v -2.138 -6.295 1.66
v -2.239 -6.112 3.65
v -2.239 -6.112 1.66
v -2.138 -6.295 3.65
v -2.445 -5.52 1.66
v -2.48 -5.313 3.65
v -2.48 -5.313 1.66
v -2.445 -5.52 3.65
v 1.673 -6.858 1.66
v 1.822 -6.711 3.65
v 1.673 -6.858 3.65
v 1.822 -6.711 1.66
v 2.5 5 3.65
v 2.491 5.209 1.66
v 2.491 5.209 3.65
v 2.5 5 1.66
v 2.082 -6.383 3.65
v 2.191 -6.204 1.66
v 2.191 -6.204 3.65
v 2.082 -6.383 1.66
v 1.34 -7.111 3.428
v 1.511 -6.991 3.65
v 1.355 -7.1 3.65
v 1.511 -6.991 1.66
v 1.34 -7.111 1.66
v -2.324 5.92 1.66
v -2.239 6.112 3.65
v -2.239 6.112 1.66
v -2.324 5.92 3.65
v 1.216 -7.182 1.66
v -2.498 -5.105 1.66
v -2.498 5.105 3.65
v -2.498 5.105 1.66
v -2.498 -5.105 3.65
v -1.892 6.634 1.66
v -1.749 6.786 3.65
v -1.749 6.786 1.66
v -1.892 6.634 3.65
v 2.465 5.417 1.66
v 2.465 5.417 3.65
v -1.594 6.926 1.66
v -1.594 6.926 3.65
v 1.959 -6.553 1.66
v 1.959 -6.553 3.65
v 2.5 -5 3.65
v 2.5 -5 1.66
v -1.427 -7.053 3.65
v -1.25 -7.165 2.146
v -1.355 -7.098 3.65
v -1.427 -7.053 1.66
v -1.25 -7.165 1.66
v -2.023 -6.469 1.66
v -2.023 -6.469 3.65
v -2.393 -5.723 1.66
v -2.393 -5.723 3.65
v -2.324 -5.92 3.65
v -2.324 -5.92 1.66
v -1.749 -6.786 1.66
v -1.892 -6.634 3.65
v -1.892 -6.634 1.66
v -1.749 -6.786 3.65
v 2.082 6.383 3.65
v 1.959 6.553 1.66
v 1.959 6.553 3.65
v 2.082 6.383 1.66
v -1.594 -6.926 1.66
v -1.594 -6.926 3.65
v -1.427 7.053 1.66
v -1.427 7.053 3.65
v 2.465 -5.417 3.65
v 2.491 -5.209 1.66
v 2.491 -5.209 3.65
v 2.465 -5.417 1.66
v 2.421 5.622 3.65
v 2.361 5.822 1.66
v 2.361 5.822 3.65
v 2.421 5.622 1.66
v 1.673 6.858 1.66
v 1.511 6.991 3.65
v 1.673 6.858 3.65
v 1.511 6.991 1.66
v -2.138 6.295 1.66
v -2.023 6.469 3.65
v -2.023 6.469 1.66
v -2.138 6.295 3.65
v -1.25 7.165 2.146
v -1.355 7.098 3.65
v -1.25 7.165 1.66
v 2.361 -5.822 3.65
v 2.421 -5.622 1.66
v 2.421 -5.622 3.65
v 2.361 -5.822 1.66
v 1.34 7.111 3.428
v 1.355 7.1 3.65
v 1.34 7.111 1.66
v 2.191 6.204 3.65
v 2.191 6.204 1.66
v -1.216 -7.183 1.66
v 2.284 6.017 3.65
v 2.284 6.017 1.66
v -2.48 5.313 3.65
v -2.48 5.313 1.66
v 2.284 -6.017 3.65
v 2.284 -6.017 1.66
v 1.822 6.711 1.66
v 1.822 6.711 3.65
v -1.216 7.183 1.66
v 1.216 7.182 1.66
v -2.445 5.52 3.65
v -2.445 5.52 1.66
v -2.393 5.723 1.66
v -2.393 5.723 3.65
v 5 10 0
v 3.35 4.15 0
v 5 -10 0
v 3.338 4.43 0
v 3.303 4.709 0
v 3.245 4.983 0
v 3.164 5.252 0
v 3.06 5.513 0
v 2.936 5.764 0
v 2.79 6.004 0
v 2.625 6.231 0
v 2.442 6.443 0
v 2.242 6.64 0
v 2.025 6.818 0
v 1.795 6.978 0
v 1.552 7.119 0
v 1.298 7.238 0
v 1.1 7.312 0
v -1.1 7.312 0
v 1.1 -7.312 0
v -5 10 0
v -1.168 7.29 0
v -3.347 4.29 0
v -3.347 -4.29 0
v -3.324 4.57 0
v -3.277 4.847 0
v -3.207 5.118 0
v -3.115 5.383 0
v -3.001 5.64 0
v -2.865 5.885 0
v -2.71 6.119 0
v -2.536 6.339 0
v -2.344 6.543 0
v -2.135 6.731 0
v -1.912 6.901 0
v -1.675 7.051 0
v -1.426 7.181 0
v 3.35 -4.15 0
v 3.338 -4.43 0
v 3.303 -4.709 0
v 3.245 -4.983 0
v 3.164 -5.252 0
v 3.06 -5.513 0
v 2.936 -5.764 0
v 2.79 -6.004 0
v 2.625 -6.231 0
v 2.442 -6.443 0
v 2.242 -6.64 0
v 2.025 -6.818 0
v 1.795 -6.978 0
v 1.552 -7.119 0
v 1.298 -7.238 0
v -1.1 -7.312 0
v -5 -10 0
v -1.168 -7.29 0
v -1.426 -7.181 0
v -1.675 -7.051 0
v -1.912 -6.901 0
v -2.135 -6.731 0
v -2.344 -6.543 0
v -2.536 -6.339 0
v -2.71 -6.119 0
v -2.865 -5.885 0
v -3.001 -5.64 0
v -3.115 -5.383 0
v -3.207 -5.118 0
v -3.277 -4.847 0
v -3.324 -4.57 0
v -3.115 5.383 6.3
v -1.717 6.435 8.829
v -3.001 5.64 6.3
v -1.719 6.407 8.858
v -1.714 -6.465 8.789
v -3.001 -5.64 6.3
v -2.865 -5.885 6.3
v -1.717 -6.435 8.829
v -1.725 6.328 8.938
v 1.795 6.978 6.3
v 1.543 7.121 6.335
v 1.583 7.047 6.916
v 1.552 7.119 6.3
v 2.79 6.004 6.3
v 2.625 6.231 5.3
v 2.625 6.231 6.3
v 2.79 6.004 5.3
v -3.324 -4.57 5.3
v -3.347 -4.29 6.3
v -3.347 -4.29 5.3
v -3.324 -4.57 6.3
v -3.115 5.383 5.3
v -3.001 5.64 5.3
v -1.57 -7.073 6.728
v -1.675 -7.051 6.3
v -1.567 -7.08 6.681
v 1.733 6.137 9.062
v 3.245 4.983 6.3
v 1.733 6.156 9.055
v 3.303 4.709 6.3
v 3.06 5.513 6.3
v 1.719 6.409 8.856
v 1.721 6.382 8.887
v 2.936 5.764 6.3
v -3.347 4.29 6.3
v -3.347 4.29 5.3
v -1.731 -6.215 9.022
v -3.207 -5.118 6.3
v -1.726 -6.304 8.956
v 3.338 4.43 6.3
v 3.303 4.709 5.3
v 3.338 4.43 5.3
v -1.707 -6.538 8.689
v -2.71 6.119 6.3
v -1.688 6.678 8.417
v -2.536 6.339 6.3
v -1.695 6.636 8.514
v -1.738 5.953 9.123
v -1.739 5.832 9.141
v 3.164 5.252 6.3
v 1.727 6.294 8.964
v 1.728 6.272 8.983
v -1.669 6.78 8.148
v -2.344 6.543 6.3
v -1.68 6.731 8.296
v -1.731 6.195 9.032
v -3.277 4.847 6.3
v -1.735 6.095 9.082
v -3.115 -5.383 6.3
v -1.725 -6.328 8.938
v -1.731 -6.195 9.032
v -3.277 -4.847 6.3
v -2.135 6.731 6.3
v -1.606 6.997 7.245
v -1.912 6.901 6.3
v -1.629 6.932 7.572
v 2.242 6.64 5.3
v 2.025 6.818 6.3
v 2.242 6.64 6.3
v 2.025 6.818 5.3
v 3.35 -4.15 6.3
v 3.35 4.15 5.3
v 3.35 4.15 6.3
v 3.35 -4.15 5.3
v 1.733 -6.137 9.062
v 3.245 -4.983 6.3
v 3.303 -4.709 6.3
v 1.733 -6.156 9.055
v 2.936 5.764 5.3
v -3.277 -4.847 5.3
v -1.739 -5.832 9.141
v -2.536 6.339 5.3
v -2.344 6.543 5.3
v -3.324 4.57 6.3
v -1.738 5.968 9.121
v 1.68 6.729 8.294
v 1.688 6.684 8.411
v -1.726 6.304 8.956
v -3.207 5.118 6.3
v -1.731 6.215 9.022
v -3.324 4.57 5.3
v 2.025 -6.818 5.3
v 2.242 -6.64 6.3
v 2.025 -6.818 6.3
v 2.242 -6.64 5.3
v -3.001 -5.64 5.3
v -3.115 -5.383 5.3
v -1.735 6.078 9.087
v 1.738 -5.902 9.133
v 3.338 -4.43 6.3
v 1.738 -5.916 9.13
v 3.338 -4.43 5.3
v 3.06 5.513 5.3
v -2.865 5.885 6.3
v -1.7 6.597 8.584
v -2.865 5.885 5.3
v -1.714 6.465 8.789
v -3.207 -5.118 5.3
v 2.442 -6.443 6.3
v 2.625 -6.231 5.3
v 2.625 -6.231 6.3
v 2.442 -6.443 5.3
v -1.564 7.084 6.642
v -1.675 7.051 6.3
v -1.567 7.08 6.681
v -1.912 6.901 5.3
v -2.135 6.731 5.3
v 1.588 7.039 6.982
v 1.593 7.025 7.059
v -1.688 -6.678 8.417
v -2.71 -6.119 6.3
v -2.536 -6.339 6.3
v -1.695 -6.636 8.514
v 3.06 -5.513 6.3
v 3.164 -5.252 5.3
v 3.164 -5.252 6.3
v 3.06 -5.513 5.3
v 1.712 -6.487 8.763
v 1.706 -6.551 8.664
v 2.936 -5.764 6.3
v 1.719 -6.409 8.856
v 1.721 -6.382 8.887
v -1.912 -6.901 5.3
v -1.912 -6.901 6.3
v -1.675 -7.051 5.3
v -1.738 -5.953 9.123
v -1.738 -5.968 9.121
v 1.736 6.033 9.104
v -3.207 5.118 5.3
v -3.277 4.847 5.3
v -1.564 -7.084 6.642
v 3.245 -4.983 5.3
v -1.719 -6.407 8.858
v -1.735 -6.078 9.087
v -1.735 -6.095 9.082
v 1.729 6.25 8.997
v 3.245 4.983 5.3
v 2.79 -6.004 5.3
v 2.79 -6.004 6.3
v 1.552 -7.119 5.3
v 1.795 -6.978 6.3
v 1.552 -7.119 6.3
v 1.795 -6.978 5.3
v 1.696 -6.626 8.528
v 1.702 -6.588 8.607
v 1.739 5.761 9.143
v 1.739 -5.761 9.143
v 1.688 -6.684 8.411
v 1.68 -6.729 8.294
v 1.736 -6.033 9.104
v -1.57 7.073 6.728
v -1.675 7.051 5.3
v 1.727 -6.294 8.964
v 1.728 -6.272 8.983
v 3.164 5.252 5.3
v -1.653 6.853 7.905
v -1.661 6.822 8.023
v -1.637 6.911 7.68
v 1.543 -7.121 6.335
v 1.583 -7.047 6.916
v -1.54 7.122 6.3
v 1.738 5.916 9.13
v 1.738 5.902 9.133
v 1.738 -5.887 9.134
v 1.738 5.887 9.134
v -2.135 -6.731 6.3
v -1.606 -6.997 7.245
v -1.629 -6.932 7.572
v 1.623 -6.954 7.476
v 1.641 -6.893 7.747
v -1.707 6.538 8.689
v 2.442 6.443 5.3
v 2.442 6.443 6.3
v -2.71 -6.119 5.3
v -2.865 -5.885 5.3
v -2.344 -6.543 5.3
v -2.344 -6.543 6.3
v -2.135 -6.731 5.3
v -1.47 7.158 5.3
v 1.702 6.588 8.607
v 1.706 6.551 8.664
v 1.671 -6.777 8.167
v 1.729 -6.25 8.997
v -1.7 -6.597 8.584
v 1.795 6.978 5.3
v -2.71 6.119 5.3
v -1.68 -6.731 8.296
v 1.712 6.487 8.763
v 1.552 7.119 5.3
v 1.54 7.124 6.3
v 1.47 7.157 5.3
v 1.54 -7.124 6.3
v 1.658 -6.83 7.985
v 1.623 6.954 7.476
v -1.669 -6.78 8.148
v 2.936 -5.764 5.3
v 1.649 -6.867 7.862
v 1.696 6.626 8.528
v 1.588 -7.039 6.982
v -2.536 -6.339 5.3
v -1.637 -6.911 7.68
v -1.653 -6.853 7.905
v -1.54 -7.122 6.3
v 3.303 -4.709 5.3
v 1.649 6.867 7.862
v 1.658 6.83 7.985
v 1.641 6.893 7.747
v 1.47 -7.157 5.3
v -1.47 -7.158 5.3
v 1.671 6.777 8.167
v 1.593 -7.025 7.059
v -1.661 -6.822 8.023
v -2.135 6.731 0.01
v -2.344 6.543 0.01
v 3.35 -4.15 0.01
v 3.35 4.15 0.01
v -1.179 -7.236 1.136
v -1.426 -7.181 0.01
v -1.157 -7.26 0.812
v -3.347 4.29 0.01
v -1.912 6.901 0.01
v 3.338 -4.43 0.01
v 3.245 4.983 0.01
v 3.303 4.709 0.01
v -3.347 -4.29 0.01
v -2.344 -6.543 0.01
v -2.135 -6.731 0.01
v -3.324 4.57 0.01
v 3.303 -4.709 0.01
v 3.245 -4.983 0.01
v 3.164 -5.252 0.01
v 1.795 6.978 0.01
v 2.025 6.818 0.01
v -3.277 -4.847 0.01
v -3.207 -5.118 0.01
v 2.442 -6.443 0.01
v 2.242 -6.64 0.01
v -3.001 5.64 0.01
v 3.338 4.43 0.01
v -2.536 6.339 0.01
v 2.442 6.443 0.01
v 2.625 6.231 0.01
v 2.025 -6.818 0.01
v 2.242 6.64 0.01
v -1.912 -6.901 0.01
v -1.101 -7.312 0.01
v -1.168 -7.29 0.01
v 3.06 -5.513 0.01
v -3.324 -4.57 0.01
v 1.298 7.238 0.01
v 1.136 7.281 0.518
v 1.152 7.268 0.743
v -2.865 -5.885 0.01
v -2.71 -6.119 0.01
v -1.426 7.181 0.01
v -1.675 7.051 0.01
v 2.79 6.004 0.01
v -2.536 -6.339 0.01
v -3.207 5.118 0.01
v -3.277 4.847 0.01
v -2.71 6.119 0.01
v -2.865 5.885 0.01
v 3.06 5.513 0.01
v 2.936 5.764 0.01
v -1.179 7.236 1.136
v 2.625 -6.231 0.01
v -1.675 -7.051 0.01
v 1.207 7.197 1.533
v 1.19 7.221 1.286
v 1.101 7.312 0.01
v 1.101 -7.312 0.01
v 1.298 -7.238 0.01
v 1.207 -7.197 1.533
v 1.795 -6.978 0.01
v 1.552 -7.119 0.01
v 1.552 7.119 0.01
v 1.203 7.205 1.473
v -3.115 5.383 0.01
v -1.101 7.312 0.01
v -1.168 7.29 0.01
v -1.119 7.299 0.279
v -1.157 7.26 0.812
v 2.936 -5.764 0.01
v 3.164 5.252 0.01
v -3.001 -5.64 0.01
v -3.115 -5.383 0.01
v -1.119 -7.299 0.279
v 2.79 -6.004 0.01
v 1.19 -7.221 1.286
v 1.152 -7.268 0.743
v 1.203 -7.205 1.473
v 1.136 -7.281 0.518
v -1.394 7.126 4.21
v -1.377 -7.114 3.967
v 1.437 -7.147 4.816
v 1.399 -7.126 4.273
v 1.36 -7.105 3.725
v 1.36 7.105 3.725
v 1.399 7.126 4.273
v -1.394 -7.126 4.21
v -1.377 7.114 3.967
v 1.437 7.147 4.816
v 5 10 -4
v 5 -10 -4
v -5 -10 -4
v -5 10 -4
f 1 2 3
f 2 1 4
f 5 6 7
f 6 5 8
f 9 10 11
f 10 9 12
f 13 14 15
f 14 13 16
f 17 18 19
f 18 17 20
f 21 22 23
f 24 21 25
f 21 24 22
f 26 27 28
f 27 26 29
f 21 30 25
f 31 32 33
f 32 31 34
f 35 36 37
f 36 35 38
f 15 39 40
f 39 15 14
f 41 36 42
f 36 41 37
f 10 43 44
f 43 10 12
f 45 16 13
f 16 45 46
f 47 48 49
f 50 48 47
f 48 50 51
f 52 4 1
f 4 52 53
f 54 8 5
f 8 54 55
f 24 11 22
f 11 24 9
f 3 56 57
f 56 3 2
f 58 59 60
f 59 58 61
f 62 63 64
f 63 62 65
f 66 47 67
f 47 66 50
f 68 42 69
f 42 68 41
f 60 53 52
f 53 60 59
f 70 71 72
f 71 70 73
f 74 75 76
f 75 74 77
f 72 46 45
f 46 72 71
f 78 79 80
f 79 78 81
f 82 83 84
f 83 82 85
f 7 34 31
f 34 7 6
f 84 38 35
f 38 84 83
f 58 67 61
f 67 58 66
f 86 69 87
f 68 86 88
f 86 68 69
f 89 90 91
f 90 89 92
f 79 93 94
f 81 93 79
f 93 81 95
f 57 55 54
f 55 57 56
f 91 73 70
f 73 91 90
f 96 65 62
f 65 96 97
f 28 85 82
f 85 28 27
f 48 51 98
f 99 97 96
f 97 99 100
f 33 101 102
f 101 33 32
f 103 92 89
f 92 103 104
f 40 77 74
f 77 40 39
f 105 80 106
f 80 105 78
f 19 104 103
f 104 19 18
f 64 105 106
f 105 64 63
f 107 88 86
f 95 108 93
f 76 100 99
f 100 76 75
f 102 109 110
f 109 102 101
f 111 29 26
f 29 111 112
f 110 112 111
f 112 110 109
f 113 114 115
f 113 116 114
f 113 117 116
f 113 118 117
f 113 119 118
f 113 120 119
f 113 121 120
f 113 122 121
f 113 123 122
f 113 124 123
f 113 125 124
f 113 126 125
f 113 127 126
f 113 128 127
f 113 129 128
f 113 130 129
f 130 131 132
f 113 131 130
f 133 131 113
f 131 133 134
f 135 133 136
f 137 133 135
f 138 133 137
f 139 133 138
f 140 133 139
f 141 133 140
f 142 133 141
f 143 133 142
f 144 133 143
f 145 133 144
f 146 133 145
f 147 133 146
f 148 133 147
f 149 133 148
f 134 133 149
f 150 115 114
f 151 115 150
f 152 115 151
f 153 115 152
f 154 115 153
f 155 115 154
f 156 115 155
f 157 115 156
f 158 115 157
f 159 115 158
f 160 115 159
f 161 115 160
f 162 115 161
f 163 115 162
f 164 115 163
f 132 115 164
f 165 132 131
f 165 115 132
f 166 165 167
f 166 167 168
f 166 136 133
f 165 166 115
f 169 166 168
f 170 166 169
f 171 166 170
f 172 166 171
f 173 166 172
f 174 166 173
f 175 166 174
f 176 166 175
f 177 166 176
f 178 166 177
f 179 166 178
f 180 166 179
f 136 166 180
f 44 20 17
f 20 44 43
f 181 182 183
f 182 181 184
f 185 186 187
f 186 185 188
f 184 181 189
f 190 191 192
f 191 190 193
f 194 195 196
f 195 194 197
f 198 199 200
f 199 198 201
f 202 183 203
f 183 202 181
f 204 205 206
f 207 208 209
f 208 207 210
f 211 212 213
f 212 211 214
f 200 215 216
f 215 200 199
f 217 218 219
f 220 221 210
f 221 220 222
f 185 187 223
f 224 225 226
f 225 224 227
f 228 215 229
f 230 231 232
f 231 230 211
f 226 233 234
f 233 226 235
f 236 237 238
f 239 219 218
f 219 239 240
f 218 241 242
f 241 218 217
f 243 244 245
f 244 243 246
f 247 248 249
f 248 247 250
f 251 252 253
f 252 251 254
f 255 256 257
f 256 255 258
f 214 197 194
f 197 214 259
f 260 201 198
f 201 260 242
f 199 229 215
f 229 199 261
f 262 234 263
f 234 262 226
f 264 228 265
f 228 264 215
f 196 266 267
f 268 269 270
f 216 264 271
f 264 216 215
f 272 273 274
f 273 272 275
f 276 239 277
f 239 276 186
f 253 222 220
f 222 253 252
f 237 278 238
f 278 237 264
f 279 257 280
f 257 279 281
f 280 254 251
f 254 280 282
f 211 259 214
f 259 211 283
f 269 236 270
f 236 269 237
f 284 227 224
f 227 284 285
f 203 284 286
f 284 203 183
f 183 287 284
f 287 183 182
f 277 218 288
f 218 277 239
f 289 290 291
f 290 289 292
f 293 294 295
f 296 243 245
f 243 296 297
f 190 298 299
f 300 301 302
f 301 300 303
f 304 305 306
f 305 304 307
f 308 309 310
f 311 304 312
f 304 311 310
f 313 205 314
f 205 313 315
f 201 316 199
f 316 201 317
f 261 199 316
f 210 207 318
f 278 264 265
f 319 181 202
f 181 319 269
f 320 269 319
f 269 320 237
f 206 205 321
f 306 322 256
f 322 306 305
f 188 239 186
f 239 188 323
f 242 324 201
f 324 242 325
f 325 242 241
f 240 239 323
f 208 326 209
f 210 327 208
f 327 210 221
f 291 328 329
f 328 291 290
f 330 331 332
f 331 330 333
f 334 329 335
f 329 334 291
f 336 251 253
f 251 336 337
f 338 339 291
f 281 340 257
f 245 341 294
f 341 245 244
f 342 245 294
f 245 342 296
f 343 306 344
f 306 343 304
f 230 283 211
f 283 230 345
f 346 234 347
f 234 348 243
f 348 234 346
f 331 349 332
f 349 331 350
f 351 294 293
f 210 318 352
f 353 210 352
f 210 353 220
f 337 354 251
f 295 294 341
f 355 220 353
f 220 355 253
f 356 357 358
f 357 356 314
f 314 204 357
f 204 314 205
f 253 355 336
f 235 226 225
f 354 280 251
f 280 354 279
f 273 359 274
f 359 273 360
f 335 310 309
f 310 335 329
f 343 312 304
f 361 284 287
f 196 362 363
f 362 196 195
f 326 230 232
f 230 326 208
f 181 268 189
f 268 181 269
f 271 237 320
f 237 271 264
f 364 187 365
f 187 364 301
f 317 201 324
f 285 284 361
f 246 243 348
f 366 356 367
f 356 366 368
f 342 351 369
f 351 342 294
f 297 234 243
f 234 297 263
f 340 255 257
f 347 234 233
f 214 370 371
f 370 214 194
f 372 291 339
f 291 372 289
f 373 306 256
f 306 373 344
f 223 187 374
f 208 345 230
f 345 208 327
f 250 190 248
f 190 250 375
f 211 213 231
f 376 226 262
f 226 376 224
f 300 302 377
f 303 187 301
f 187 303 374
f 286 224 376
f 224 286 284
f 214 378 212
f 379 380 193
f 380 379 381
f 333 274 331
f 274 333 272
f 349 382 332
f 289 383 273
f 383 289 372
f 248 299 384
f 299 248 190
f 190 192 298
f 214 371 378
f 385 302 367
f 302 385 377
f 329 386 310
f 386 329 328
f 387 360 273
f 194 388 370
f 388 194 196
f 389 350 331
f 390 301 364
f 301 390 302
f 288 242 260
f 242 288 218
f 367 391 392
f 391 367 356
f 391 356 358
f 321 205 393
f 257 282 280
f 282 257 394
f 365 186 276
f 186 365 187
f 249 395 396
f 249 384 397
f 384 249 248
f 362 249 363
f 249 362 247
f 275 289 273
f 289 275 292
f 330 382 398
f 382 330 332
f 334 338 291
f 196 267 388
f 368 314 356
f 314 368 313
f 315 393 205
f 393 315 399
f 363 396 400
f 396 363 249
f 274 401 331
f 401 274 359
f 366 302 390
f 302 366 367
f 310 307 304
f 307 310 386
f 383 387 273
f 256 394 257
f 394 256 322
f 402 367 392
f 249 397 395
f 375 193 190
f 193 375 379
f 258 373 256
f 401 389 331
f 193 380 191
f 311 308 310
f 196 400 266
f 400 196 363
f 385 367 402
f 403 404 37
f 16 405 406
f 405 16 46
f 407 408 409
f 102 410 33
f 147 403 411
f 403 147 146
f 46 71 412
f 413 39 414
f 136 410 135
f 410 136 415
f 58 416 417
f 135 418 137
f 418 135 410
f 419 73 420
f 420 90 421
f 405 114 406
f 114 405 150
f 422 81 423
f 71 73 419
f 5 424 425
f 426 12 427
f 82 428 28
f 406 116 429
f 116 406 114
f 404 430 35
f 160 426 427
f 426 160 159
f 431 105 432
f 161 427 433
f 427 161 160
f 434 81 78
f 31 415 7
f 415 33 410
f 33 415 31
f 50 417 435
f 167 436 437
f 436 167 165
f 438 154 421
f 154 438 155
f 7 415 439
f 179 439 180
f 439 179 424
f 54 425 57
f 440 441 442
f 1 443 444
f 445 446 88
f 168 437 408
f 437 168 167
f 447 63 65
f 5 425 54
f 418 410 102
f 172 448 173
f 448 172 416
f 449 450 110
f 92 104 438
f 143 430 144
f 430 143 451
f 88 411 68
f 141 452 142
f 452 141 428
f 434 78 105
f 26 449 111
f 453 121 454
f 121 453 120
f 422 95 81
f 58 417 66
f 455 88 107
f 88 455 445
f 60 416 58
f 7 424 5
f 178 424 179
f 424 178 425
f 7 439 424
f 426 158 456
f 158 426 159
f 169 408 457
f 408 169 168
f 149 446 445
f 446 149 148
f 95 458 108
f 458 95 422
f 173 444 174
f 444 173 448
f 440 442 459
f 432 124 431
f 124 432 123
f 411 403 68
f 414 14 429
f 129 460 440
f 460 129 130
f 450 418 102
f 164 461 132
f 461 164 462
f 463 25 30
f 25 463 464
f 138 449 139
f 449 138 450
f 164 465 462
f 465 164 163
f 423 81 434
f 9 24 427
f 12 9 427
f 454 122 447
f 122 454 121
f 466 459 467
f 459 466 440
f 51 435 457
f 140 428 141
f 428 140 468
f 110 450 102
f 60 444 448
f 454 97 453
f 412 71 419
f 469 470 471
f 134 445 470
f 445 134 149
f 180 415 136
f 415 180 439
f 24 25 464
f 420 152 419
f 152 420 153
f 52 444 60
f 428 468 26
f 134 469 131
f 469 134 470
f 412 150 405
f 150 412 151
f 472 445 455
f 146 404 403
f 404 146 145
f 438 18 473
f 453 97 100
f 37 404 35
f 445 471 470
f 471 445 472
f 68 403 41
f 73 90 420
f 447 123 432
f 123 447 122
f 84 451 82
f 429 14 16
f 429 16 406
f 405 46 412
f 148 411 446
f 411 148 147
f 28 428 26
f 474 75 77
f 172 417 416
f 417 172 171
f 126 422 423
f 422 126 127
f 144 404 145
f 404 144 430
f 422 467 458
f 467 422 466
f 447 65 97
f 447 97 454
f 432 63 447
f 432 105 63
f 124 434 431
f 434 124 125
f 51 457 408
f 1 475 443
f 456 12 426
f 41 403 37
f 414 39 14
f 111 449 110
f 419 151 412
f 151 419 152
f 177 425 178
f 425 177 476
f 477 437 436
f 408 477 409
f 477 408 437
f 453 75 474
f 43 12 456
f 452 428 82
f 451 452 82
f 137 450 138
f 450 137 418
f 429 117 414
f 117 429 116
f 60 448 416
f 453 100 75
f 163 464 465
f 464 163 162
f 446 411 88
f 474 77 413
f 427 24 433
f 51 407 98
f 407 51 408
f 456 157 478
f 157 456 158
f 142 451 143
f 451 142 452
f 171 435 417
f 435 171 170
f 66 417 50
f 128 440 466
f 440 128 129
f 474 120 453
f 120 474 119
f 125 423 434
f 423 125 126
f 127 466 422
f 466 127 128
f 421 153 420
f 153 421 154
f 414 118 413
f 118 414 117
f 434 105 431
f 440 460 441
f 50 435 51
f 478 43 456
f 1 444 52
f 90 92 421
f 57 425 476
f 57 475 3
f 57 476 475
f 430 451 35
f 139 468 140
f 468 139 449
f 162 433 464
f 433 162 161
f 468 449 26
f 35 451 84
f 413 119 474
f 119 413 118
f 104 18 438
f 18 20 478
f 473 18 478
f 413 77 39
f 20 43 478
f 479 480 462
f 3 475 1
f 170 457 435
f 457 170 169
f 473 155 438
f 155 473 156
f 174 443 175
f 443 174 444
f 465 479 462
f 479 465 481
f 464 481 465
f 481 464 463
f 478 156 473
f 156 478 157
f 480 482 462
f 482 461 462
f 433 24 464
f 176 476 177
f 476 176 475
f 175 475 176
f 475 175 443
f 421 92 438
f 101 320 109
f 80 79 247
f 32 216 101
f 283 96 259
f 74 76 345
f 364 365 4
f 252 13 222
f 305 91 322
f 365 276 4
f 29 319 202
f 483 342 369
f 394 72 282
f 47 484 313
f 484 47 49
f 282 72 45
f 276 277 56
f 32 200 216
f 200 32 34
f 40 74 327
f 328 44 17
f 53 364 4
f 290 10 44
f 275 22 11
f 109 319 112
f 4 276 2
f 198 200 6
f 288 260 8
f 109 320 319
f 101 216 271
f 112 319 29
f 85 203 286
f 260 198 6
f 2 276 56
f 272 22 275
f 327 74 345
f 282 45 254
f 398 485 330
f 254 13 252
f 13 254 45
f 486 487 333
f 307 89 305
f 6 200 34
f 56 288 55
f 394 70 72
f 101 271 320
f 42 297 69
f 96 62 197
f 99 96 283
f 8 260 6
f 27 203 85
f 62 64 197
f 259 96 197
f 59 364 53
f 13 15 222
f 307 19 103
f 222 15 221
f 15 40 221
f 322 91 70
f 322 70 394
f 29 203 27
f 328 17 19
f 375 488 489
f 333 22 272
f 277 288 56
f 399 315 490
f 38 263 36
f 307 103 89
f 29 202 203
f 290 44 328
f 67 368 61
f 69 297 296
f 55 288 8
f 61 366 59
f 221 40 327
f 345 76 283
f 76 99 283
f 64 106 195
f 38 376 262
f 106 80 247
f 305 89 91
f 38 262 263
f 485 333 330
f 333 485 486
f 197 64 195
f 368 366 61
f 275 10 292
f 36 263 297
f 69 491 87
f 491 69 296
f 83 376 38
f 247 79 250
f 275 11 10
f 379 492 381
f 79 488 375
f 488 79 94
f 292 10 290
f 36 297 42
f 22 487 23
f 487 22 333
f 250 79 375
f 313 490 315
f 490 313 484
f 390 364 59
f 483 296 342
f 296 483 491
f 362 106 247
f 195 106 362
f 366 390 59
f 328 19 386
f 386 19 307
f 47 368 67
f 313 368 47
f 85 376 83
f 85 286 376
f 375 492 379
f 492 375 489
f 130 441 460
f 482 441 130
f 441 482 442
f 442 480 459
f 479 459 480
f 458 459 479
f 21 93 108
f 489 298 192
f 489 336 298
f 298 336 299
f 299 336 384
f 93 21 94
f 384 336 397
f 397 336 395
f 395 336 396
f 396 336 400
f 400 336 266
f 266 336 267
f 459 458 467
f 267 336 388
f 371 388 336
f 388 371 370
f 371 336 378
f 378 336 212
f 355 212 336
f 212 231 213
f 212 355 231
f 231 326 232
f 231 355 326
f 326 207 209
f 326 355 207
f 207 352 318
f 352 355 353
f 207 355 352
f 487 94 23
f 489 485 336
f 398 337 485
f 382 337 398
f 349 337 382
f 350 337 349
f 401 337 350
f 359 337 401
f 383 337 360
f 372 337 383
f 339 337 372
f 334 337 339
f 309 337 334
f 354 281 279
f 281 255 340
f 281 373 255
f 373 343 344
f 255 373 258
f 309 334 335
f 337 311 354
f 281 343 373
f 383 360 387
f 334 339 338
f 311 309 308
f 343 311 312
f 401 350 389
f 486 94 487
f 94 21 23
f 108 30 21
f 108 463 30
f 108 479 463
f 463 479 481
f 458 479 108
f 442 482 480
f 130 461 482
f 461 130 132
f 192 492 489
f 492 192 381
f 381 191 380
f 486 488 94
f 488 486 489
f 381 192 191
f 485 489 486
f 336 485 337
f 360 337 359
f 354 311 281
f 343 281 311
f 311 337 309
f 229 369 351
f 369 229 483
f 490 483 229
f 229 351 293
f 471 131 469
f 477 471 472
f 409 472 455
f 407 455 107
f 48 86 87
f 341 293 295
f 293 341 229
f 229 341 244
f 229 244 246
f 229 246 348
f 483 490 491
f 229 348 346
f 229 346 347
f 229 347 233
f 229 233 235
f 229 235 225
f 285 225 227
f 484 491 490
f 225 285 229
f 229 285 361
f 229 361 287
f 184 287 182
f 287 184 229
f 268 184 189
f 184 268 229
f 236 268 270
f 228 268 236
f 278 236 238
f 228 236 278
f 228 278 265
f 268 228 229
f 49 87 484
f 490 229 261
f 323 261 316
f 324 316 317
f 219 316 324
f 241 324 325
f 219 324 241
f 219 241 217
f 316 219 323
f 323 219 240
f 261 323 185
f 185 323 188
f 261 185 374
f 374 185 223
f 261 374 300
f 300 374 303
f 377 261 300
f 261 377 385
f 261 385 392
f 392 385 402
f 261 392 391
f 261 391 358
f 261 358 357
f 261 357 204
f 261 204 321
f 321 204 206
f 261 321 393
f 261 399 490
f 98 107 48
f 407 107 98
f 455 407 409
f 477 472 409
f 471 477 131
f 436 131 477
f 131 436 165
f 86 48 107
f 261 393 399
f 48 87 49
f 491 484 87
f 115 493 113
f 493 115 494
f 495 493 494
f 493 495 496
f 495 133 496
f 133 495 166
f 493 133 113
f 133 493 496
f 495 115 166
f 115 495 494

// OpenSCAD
$fn = $preview ? 25 : 75;

magic = 0.01;
clipX = 5;
clipY = 15;
clipH = 5.3; // i.e. IKEA plate thickness
clipToothR = .85;
clipToothH = 1.5;
clipSplit1 = 2.2;
clipSplit2 = 3.5;
clipZRound = 1.65;
clipTopExtra1 = 1;
clipTopExtra2 = 3;

// Sample:
translate([ -5, -10, -4 ])
cube([ 10, 20, 4 ]);
clipPushed();

module clipPushed() {
  color("Chocolate") // https://en.wikibooks.org/wiki/OpenSCAD_User_Manual/Transformations#color
  difference() {
    union() {
      clipPushedLayer(clipH, 0); // main body
      hull() { // top extra
        translate([ 0, 0, clipH ]) clipPushedLayer(clipTopExtra1);
        translate([ 0, 0, clipH + clipTopExtra1 ]) clipPushedLayer(clipTopExtra2, -clipToothR);
      }
      hull() { // root
        translate([ 0, 0, 0 ]) clipPushedLayer(magic);
        translate([ 0, 0, clipZRound ]) clipPushedLayer(magic, 0);
      }
      hull() { // opposite
        translate([ 0, 0, clipH - clipZRound ]) clipPushedLayer(magic, 0);
        translate([ 0, 0, clipH ]) clipPushedLayer(magic);
      }
    }
    hull() { // split space
      translate([ clipSplit1 / -2, clipY / -2, 0 ])
      cube([ clipSplit1, clipY, magic ]);
      translate([ clipSplit2 / -2, clipY / -2, clipH + clipTopExtra1 + clipTopExtra2 ])
      cube([ clipSplit2, clipY, magic ]);
    }
  }
}

module clipPushedLayer(layerH = clipH, extraX = clipToothR) {
  hull() {
    translate([ 0, (clipY - clipX) / 2 - extraX, 0 ])
    cylinder(d = clipX + extraX * 2, h = layerH);
    translate([ 0, (clipY - clipX) / -2 + extraX, 0 ])
    cylinder(d = clipX + extraX * 2, h = layerH);
  }
}
